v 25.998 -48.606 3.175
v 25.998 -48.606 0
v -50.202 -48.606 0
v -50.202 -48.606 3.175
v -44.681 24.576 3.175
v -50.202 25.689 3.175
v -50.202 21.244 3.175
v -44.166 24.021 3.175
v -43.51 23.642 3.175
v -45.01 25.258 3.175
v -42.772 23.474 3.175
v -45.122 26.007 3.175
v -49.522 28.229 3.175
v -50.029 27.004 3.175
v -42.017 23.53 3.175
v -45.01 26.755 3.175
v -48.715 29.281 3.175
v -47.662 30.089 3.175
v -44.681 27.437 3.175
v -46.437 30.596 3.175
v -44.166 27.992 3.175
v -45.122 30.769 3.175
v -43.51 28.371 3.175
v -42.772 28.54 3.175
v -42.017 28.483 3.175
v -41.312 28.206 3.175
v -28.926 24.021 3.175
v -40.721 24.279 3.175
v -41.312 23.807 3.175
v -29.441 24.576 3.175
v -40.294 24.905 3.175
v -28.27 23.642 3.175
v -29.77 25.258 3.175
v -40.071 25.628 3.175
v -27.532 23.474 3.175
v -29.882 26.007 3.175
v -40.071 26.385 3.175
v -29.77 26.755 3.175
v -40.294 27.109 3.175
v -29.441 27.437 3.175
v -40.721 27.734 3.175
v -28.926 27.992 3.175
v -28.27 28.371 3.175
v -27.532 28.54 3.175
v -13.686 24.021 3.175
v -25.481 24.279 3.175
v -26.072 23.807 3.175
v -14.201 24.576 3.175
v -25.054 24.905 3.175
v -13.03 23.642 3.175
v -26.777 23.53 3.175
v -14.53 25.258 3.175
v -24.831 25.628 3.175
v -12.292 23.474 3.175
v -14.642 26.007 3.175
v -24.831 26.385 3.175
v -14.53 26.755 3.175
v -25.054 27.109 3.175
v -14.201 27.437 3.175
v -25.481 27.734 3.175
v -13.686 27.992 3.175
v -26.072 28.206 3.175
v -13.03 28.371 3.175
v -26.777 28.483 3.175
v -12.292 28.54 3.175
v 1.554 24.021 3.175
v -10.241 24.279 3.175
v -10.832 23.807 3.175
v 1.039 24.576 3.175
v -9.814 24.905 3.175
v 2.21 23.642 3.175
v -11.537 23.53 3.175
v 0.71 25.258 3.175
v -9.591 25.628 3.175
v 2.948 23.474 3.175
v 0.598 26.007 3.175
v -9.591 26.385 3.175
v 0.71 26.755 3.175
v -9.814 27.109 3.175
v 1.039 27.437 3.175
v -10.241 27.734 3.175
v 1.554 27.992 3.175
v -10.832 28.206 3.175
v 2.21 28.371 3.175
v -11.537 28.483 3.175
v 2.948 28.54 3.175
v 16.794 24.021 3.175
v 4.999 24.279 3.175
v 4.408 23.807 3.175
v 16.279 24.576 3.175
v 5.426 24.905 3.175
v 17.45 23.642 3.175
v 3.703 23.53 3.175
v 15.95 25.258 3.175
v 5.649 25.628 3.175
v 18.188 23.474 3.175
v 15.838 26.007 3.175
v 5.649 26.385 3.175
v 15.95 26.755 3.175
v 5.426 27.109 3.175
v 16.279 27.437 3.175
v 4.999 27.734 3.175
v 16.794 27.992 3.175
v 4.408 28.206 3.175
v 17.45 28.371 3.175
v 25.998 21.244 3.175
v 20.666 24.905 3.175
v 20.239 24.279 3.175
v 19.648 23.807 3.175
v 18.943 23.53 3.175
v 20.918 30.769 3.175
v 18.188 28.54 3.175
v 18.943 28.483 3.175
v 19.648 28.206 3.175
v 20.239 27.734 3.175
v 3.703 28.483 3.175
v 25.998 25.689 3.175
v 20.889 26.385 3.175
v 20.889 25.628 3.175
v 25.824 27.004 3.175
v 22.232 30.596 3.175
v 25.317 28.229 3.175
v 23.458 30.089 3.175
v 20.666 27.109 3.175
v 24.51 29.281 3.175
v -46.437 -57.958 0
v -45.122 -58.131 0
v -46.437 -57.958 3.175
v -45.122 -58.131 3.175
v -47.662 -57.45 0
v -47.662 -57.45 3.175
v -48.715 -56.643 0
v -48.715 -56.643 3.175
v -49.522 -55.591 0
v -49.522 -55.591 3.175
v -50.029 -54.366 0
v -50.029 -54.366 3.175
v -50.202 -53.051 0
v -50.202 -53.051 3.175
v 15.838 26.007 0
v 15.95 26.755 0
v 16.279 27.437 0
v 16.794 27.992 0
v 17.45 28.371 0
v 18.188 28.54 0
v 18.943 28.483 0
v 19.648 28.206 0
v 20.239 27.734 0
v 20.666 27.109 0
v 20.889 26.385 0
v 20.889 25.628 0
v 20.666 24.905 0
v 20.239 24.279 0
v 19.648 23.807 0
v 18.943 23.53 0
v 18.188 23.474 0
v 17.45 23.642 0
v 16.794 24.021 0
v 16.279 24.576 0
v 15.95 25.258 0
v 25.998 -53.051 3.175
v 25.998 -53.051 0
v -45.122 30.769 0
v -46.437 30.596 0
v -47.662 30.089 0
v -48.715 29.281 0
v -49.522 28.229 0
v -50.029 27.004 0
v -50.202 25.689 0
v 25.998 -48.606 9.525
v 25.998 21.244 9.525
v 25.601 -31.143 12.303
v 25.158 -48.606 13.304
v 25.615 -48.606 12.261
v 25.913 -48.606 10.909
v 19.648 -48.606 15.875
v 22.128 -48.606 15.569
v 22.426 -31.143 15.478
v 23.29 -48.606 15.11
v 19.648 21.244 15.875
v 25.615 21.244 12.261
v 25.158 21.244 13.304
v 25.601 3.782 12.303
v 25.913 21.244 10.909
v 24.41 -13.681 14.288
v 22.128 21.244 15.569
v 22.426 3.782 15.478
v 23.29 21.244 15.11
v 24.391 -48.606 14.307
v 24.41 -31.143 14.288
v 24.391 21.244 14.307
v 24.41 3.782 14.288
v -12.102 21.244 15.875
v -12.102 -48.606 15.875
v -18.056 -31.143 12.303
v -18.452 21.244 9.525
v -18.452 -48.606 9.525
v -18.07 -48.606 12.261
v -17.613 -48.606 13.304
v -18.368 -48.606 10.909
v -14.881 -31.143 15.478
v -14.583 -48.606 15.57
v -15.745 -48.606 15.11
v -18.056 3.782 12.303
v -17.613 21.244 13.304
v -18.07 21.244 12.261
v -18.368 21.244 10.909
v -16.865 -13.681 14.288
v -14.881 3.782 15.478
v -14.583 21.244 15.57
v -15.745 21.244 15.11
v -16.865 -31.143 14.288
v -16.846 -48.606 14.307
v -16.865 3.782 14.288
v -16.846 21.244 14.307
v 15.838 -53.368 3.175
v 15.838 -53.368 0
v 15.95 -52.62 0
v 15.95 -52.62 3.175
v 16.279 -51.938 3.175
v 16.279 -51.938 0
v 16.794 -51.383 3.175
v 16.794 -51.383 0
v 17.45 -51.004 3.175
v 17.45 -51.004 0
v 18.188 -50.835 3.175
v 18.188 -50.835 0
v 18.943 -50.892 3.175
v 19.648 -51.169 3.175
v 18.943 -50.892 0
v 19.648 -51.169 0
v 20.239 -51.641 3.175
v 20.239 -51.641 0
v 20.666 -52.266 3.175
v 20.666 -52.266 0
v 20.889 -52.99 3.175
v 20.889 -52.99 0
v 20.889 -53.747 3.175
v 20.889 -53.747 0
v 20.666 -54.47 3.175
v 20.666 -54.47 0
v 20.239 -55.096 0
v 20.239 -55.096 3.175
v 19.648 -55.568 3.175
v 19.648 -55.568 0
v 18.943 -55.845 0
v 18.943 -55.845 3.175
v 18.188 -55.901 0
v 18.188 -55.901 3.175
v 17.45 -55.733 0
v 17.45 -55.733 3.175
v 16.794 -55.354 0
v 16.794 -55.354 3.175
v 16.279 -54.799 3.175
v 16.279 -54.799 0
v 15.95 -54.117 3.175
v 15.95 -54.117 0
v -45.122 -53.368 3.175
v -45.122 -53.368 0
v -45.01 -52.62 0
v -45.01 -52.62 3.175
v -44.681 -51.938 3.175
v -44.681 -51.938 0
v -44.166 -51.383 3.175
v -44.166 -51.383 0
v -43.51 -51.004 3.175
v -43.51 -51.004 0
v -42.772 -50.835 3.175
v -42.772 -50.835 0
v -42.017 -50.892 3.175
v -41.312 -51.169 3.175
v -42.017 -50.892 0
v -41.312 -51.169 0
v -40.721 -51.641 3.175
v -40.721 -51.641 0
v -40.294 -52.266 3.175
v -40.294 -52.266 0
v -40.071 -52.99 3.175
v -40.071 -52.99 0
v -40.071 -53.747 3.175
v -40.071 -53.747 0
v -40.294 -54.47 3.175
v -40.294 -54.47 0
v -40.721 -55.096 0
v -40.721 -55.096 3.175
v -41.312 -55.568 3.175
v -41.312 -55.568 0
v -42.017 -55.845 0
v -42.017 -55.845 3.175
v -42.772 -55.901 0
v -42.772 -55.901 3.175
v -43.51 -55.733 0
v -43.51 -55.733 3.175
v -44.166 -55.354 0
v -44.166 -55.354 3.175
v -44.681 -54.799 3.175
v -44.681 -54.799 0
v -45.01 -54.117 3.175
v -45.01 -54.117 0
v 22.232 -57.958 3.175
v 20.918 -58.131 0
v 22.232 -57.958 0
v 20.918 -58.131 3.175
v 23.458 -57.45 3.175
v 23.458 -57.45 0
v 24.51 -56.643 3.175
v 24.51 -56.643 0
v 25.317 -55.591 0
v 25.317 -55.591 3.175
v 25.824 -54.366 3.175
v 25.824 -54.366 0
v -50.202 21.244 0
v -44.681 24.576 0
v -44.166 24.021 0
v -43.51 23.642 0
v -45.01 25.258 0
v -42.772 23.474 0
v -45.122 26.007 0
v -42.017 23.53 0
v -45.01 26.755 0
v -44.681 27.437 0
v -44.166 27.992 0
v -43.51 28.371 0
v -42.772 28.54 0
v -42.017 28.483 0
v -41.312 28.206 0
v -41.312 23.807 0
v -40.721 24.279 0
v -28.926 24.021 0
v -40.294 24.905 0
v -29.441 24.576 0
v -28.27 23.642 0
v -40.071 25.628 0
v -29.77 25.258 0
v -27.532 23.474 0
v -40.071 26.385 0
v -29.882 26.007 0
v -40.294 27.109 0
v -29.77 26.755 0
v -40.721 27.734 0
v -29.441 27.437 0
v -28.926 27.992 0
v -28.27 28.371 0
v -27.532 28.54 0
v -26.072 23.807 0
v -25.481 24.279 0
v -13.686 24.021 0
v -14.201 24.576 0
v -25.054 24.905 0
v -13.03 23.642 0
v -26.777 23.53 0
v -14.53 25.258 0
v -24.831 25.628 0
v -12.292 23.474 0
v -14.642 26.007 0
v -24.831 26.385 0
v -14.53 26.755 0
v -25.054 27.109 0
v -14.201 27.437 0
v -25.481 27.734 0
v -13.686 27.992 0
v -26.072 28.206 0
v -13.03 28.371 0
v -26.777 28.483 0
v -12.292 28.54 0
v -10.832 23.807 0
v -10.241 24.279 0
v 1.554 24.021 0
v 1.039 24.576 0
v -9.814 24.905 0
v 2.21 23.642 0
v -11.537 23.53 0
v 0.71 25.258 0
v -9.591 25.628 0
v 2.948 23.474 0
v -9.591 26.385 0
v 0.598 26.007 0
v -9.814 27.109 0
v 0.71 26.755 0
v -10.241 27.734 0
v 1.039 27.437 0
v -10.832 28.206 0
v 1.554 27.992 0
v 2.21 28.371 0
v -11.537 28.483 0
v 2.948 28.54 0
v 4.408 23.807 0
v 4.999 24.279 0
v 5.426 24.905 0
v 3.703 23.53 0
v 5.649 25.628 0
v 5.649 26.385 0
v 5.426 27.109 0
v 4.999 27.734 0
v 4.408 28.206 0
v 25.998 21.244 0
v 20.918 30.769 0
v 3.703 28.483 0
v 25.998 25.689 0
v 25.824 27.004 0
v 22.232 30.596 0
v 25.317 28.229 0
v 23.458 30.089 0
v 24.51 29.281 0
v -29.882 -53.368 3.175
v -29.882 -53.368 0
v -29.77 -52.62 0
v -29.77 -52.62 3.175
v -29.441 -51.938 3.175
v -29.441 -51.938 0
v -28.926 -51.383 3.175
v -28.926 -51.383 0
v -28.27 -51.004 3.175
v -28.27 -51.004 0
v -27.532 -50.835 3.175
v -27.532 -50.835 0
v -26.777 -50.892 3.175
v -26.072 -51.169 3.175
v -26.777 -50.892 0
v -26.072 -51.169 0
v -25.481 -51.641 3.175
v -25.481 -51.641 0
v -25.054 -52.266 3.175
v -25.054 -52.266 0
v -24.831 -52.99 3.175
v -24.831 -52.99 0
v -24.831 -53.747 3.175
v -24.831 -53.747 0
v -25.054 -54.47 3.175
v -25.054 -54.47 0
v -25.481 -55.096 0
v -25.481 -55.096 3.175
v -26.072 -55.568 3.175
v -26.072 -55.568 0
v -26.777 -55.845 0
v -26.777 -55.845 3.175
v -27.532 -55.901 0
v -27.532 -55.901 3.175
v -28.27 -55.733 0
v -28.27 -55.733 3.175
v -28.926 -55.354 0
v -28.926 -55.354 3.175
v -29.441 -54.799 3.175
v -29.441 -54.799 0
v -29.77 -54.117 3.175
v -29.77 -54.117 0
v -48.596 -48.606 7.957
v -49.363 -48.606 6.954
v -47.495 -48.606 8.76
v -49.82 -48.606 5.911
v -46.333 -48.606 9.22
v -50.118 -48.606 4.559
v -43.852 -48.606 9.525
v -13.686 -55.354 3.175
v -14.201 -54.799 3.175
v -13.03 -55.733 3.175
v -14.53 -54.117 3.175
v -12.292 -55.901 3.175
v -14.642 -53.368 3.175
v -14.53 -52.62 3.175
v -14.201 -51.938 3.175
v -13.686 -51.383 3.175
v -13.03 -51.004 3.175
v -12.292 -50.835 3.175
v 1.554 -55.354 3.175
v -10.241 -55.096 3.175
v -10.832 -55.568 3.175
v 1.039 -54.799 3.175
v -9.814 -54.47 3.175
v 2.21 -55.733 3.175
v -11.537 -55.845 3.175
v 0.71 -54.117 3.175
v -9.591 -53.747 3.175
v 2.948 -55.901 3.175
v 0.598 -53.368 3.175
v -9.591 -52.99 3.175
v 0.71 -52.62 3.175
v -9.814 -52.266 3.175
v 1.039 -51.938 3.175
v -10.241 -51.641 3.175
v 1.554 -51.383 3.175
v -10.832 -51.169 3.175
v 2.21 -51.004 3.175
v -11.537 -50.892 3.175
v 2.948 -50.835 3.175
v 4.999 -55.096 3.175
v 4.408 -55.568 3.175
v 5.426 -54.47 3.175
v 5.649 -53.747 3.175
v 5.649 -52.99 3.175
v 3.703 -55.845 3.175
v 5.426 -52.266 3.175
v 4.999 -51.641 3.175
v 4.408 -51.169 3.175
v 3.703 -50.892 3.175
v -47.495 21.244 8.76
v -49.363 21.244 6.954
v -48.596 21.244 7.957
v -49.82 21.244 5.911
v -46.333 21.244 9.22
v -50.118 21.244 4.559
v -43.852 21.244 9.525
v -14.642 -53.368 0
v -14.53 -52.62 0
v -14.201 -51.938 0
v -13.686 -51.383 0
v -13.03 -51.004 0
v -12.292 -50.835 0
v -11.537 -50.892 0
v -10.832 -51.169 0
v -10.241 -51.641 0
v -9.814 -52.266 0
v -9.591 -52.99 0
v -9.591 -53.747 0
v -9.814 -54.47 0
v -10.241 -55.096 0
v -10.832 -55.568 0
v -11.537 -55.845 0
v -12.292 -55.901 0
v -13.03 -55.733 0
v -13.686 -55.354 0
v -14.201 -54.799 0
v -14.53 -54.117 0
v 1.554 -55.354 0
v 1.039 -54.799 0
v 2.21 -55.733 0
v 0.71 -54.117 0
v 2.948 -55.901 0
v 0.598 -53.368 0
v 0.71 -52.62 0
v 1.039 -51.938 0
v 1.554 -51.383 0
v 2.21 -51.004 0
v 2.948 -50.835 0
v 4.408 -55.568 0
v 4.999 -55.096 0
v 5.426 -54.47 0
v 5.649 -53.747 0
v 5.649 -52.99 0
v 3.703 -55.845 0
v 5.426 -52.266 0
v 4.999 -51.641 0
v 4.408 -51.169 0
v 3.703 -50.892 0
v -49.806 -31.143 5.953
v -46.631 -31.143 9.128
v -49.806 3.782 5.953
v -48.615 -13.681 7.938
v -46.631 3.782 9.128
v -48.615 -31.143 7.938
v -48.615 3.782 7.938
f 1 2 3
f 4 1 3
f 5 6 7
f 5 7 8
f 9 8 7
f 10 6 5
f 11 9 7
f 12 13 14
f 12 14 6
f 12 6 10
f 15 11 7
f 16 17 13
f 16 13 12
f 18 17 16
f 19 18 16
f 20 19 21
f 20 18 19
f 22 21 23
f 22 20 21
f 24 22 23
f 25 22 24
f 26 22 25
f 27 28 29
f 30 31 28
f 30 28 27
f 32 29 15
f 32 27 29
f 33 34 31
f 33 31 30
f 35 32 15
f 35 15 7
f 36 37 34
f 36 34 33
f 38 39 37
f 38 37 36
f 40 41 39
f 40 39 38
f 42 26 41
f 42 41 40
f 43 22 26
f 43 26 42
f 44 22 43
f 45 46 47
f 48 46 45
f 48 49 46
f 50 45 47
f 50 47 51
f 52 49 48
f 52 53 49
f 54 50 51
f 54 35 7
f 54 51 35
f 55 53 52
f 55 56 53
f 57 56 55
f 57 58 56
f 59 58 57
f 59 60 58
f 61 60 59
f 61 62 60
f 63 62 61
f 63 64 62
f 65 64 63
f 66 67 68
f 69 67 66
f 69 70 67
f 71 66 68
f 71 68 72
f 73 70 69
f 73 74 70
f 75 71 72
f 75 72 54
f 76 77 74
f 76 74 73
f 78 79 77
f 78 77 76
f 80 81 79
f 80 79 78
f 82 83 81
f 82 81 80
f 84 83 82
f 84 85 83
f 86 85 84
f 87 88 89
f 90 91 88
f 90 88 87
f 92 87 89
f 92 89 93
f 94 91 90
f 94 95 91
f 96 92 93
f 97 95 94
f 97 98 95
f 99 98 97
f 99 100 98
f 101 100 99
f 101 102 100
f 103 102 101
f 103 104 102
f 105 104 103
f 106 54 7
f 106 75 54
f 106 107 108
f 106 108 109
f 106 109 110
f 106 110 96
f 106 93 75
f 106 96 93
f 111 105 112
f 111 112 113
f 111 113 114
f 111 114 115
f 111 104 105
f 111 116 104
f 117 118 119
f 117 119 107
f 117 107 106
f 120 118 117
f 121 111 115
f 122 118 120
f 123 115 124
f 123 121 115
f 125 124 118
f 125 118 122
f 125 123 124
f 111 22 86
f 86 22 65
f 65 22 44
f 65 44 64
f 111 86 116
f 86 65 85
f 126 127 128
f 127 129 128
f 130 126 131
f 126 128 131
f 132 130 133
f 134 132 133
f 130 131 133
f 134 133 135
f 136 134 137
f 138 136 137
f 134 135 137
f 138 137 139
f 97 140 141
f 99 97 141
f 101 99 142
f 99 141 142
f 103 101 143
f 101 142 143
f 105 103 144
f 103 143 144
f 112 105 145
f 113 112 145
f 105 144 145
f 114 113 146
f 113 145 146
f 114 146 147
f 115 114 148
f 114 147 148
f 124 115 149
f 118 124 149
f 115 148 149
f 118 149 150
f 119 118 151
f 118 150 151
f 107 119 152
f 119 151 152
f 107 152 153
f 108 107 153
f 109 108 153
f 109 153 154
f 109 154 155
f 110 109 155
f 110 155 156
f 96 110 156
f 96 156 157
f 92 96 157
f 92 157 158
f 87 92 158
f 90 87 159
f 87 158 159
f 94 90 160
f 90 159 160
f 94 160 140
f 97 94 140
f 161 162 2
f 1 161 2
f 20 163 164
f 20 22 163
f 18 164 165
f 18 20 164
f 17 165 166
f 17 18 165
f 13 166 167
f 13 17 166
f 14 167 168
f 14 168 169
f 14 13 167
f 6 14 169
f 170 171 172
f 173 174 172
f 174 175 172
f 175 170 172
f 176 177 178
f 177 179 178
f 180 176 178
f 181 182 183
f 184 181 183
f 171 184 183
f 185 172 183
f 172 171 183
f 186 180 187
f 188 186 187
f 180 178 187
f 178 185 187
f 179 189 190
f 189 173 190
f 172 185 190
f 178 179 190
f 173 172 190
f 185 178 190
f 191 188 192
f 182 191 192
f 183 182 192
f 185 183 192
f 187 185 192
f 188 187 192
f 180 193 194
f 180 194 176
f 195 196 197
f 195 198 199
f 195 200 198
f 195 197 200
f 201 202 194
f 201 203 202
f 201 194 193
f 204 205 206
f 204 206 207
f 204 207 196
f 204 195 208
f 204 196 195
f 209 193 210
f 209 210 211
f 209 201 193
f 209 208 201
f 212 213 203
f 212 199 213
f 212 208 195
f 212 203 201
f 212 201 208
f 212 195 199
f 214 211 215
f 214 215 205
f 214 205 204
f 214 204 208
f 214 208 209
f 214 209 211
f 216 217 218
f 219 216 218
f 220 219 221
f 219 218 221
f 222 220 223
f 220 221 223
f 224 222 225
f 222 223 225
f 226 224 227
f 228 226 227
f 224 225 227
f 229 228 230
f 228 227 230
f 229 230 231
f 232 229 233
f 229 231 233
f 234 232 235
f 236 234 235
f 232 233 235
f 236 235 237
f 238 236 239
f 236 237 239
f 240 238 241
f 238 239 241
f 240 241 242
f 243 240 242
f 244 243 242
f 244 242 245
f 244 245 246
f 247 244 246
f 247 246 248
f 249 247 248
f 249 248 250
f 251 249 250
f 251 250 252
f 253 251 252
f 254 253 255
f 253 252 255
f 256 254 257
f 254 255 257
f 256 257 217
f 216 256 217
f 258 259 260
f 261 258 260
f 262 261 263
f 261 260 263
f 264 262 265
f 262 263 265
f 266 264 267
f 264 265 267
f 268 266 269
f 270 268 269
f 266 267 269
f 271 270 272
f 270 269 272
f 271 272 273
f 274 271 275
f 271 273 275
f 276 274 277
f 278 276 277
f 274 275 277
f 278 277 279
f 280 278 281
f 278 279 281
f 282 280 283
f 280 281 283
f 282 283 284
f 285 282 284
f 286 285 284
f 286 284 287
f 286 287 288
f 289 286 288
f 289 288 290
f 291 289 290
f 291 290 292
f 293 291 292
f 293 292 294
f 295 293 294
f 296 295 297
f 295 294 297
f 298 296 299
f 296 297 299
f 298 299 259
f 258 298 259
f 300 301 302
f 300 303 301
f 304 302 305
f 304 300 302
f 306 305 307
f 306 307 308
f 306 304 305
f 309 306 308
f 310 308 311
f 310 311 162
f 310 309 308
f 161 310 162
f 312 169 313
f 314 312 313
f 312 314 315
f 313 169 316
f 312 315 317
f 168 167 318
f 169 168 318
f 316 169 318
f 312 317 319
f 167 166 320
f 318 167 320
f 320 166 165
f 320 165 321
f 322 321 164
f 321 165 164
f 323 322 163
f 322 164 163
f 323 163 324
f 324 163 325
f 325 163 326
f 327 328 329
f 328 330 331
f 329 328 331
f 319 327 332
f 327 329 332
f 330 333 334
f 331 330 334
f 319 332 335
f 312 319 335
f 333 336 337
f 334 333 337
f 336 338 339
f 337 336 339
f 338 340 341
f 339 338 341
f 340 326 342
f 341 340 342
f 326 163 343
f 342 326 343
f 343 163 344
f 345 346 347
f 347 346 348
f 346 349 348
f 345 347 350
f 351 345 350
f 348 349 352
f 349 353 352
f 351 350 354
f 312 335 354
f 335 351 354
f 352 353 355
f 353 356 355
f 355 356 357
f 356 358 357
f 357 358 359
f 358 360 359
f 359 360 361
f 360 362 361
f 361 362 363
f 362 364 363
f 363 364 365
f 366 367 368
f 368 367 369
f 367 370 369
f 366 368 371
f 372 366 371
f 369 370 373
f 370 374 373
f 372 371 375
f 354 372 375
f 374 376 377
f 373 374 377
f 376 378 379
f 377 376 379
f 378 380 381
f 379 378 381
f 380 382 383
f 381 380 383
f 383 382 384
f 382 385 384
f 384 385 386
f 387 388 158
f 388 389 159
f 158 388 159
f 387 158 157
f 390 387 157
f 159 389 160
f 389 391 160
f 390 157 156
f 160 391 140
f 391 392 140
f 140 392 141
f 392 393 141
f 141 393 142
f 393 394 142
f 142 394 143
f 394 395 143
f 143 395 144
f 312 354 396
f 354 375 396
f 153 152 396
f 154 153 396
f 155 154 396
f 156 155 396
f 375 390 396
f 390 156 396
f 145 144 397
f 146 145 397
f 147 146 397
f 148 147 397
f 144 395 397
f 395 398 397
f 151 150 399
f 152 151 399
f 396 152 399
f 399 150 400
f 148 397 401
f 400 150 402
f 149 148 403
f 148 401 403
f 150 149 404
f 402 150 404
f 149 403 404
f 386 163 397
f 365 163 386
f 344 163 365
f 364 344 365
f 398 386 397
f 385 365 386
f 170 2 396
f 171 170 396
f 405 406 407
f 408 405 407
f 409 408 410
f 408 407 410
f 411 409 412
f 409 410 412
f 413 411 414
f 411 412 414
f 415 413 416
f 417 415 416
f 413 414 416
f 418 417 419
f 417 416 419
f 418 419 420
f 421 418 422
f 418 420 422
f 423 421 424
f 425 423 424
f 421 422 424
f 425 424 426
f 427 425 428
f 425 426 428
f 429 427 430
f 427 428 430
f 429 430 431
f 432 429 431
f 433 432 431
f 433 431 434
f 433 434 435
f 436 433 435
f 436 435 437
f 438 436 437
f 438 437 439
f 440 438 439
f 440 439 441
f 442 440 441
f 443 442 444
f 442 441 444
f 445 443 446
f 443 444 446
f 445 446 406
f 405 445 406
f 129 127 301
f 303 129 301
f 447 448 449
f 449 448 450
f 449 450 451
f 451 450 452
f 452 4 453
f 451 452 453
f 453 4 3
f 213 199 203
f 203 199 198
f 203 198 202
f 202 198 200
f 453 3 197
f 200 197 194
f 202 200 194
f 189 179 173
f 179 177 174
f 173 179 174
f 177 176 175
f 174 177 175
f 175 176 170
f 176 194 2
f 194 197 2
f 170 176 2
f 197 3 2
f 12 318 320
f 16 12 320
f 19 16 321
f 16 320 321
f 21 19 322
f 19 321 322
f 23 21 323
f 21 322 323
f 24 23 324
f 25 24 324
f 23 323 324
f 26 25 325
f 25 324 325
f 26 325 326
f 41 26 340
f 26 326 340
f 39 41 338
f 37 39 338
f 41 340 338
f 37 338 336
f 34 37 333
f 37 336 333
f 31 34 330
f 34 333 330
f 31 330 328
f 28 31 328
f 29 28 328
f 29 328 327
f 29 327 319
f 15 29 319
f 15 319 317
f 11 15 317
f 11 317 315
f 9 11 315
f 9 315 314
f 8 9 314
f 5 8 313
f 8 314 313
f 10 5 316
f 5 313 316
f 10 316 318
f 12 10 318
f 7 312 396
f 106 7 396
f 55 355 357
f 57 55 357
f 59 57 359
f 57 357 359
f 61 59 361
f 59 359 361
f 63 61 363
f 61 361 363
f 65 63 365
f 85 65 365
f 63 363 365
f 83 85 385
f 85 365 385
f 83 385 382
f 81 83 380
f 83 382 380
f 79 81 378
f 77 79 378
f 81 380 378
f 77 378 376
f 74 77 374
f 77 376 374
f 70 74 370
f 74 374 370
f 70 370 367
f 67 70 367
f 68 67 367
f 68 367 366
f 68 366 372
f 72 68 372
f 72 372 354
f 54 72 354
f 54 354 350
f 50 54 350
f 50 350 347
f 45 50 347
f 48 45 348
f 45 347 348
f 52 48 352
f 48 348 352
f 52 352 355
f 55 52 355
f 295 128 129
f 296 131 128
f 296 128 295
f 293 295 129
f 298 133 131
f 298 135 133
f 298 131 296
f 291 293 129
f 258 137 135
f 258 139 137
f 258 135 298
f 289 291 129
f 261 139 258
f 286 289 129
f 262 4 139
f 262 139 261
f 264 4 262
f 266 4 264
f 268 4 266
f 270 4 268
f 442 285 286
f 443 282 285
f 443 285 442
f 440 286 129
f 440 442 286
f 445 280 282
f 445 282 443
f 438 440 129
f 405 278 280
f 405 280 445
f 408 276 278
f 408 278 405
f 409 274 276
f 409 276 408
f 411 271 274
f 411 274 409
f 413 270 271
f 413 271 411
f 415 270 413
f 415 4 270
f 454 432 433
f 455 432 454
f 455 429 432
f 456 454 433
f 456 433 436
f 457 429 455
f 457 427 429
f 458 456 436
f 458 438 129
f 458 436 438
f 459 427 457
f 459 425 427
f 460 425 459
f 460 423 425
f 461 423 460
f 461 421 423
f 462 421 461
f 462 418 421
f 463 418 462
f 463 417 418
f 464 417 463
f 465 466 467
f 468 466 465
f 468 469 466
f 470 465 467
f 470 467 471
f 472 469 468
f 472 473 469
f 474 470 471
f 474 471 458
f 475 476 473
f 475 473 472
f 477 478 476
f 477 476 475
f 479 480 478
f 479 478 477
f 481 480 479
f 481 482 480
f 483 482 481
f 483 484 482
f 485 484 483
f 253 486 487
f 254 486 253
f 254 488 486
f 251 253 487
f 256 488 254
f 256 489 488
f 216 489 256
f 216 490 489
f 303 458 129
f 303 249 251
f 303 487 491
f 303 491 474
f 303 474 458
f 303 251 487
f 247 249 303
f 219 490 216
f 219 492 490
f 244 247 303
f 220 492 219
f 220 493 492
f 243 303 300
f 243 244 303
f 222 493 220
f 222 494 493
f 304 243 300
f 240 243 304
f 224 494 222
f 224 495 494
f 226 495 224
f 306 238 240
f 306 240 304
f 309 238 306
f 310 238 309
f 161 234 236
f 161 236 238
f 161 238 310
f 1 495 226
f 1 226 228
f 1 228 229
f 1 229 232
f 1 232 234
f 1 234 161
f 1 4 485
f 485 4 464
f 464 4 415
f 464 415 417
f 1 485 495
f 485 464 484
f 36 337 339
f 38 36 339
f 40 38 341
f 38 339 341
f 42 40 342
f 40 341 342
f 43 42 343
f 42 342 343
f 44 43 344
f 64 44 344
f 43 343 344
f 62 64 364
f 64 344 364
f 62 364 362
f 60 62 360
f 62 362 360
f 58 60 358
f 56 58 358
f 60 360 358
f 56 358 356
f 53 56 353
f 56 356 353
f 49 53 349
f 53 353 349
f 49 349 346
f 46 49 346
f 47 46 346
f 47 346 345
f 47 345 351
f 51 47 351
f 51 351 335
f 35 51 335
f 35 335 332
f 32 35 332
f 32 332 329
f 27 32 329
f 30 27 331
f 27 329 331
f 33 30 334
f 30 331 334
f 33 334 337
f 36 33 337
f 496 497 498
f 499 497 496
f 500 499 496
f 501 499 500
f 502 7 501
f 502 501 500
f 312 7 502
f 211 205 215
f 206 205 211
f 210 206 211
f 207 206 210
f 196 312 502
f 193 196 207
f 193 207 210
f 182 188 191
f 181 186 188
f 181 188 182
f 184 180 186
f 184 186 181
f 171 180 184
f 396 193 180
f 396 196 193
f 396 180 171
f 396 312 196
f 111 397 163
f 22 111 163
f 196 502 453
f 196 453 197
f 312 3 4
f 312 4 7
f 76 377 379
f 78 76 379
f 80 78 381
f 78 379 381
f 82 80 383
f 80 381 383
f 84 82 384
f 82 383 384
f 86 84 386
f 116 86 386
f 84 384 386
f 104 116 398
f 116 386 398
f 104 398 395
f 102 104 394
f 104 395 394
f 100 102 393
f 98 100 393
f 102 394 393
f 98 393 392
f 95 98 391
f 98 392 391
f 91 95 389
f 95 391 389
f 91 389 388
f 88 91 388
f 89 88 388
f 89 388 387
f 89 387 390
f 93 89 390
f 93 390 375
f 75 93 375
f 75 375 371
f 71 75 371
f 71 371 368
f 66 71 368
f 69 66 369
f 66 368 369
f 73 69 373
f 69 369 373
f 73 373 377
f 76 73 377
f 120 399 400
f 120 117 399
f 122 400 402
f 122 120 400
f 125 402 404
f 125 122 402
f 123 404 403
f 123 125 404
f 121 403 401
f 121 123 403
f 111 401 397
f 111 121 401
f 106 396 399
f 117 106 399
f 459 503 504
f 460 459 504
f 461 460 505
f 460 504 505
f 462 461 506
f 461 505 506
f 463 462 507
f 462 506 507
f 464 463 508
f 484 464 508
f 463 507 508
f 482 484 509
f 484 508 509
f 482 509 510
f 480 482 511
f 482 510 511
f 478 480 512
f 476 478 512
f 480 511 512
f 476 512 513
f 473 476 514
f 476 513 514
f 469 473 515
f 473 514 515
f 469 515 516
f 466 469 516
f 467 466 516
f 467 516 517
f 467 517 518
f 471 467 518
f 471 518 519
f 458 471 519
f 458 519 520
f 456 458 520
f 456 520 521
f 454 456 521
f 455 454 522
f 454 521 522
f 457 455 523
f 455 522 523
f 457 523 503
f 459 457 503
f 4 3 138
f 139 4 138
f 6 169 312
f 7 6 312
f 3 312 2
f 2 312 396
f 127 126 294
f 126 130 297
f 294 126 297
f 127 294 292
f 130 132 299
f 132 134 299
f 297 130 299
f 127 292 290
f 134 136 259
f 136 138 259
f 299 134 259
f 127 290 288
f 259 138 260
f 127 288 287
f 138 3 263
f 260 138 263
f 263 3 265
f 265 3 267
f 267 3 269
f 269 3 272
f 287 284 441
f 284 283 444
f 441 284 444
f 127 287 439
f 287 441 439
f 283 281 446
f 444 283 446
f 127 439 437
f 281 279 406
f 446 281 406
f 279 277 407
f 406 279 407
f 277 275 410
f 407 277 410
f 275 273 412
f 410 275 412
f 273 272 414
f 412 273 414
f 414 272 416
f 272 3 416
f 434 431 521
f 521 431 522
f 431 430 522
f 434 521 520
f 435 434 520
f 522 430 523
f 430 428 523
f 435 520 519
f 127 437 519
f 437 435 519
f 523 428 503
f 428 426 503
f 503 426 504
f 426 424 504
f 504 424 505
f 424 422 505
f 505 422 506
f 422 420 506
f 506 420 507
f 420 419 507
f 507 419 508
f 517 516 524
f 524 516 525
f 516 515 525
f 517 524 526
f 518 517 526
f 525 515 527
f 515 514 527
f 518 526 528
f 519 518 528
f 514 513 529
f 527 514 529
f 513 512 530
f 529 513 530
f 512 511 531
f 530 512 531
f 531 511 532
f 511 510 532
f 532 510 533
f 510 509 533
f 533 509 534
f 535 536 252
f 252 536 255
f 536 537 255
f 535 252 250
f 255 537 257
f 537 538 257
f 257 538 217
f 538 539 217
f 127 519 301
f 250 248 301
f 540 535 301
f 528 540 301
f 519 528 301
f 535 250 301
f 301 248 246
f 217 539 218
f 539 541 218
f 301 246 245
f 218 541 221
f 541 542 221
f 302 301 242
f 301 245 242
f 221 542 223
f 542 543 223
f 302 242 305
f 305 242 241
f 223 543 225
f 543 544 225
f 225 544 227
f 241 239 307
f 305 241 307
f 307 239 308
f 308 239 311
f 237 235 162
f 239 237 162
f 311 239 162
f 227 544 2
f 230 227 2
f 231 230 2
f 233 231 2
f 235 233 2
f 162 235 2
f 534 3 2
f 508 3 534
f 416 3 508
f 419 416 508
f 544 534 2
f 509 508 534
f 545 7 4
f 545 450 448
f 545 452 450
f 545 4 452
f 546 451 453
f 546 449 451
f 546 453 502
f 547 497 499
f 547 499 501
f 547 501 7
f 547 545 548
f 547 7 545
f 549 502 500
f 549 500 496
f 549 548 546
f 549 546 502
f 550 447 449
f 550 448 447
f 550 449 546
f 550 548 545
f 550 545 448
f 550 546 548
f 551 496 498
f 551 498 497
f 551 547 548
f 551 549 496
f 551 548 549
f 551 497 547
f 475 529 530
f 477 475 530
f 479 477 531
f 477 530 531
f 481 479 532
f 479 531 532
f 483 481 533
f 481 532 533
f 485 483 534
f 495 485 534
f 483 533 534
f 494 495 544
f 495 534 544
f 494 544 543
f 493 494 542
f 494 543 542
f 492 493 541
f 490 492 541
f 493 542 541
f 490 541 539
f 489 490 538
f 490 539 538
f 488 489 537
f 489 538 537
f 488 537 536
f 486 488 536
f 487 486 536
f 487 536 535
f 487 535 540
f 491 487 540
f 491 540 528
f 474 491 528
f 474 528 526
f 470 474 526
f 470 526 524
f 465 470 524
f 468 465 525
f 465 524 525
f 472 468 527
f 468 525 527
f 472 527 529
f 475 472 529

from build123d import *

# Parameters (mm, degrees)
F1_DEPTH    = 3.175
F0_W        = 76.2
F0_H        = 69.85
F2_DEPTH    = 9.525
F3_W        = 44.45
F3_H        = 69.85
F4_DEPTH    = 6.35
F5_T1_DEPTH = 101.6
F6_R        = 5.08
F6_2_R      = 5.08


# Not quite as in the source:
# - a fillet or chamfer that OpenCascade refuses, or shapes differently, is made with other operations: its cross-section is extruded or revolved along the edge and cut away or added


with BuildPart() as f1:
    # F0 (on Top) → F1 (new body)
    with BuildSketch(Plane.XY):
        with BuildLine():
            Line((-45.1224932384, -53.3683788409), (-50.2024932384, -53.3683788409))
            Line((-50.2024932384, -53.3683788409), (-50.2024932384, -58.1308788409))
            Line((-50.2024932384, -58.1308788409), (25.9975067616, -58.1308788409))
            Line((25.9975067616, -58.1308788409), (25.9975067616, -53.3683788409))
            Line((25.9975067616, -53.3683788409), (20.9175067616, -53.3683788409))
            ThreePointArc((20.9175067616, -53.3683788409), (18.3775067616, -55.9083788409), (15.8375067616, -53.3683788409))
            Line((15.8375067616, -53.3683788409), (5.6775067616, -53.3683788409))
            ThreePointArc((5.6775067616, -53.3683788409), (3.1375067616, -55.9083788409), (0.5975067616, -53.3683788409))
            Line((0.5975067616, -53.3683788409), (-9.5624932384, -53.3683788409))
            ThreePointArc((-9.5624932384, -53.3683788409), (-12.1024932384, -55.9083788409), (-14.6424932384, -53.3683788409))
            Line((-14.6424932384, -53.3683788409), (-24.8024932384, -53.3683788409))
            ThreePointArc((-24.8024932384, -53.3683788409), (-27.3424932384, -55.9083788409), (-29.8824932384, -53.3683788409))
            Line((-29.8824932384, -53.3683788409), (-40.0424932384, -53.3683788409))
            ThreePointArc((-40.0424932384, -53.3683788409), (-42.5824932384, -55.9083788409), (-45.1224932384, -53.3683788409))
        make_face()
        with BuildLine():
            Line((25.9975067616, -48.6058788409), (-50.2024932384, -48.6058788409))
            Line((-50.2024932384, -48.6058788409), (-50.2024932384, -53.3683788409))
            Line((-50.2024932384, -53.3683788409), (-45.1224932384, -53.3683788409))
            ThreePointArc((-45.1224932384, -53.3683788409), (-42.5824932384, -50.8283788409), (-40.0424932384, -53.3683788409))
            Line((-40.0424932384, -53.3683788409), (-29.8824932384, -53.3683788409))
            ThreePointArc((-29.8824932384, -53.3683788409), (-27.3424932384, -50.8283788409), (-24.8024932384, -53.3683788409))
            Line((-24.8024932384, -53.3683788409), (-14.6424932384, -53.3683788409))
            ThreePointArc((-14.6424932384, -53.3683788409), (-12.1024932384, -50.8283788409), (-9.5624932384, -53.3683788409))
            Line((-9.5624932384, -53.3683788409), (0.5975067616, -53.3683788409))
            ThreePointArc((0.5975067616, -53.3683788409), (3.1375067616, -50.8283788409), (5.6775067616, -53.3683788409))
            Line((5.6775067616, -53.3683788409), (15.8375067616, -53.3683788409))
            ThreePointArc((15.8375067616, -53.3683788409), (18.3775067616, -50.8283788409), (20.9175067616, -53.3683788409))
            Line((20.9175067616, -53.3683788409), (25.9975067616, -53.3683788409))
            Line((25.9975067616, -53.3683788409), (25.9975067616, -48.6058788409))
        make_face()
    extrude(amount=F1_DEPTH)

    # F6#2
    f6_2_edges = [f1.edges().sort_by_distance(p)[0] for p in [
        (-50.202493, -58.130879, 1.5875),
        (25.997507, -58.130879, 1.5875),
    ]]
    fillet(f6_2_edges, radius=F6_2_R)


with BuildPart() as f1b:
    # F0 (on Top) → F1, piece 2 (new body)
    with BuildSketch(Plane.XY):
        with BuildLine():
            Line((-45.1224932384, 26.0066211591), (-50.2024932384, 26.0066211591))
            Line((-50.2024932384, 26.0066211591), (-50.2024932384, 21.2441211591))
            Line((-50.2024932384, 21.2441211591), (25.9975067616, 21.2441211591))
            Line((25.9975067616, 21.2441211591), (25.9975067616, 26.0066211591))
            Line((25.9975067616, 26.0066211591), (20.9175067616, 26.0066211591))
            ThreePointArc((20.9175067616, 26.0066211591), (18.3775067616, 23.4666211591), (15.8375067616, 26.0066211591))
            Line((15.8375067616, 26.0066211591), (5.6775067616, 26.0066211591))
            ThreePointArc((5.6775067616, 26.0066211591), (3.1375067616, 23.4666211591), (0.5975067616, 26.0066211591))
            Line((0.5975067616, 26.0066211591), (-9.5624932384, 26.0066211591))
            ThreePointArc((-9.5624932384, 26.0066211591), (-12.1024932384, 23.4666211591), (-14.6424932384, 26.0066211591))
            Line((-14.6424932384, 26.0066211591), (-24.8024932384, 26.0066211591))
            ThreePointArc((-24.8024932384, 26.0066211591), (-27.3424932384, 23.4666211591), (-29.8824932384, 26.0066211591))
            Line((-29.8824932384, 26.0066211591), (-40.0424932384, 26.0066211591))
            ThreePointArc((-40.0424932384, 26.0066211591), (-42.5824932384, 23.4666211591), (-45.1224932384, 26.0066211591))
        make_face()
        with BuildLine():
            Line((25.9975067616, 30.7691211591), (-50.2024932384, 30.7691211591))
            Line((-50.2024932384, 30.7691211591), (-50.2024932384, 26.0066211591))
            Line((-50.2024932384, 26.0066211591), (-45.1224932384, 26.0066211591))
            ThreePointArc((-45.1224932384, 26.0066211591), (-42.5824932384, 28.5466211591), (-40.0424932384, 26.0066211591))
            Line((-40.0424932384, 26.0066211591), (-29.8824932384, 26.0066211591))
            ThreePointArc((-29.8824932384, 26.0066211591), (-27.3424932384, 28.5466211591), (-24.8024932384, 26.0066211591))
            Line((-24.8024932384, 26.0066211591), (-14.6424932384, 26.0066211591))
            ThreePointArc((-14.6424932384, 26.0066211591), (-12.1024932384, 28.5466211591), (-9.5624932384, 26.0066211591))
            Line((-9.5624932384, 26.0066211591), (0.5975067616, 26.0066211591))
            ThreePointArc((0.5975067616, 26.0066211591), (3.1375067616, 28.5466211591), (5.6775067616, 26.0066211591))
            Line((5.6775067616, 26.0066211591), (15.8375067616, 26.0066211591))
            ThreePointArc((15.8375067616, 26.0066211591), (18.3775067616, 28.5466211591), (20.9175067616, 26.0066211591))
            Line((20.9175067616, 26.0066211591), (25.9975067616, 26.0066211591))
            Line((25.9975067616, 26.0066211591), (25.9975067616, 30.7691211591))
        make_face()
    extrude(amount=F1_DEPTH)

    # F6
    f6_edges = [f1b.edges().sort_by_distance(p)[0] for p in [
        (25.997507, 30.769121, 1.5875),
        (-50.202493, 30.769121, 1.5875),
    ]]
    fillet(f6_edges, radius=F6_R)


with BuildPart() as f2:
    # F0 (on Top) → F2 (new body)
    with BuildSketch(Plane.XY):
        with Locations((-12.1024932384, -13.6808788409)):
            Rectangle(F0_W, F0_H)
    extrude(amount=F2_DEPTH)

    # F3 (on face) → F4 (join)
    with BuildSketch(Plane.XY.offset(9.525)):
        with Locations((3.7725067616, -13.6808788409)):
            Rectangle(F3_W, F3_H)
    extrude(amount=F4_DEPTH)

    # F5: fillet of radius 6.35 on 3 edges, made by hand

    # F5_s2 → F5_t1 (cut)
    with BuildSketch(Plane.XZ.offset(-37.1191211591)):
        with BuildLine():
            add(Edge.make_bspline(
                [(-18.4524932384, 9.525), (-18.4524932384, 15.875), (-12.1024932384, 15.875)],
                knots=[0, 0, 0, 1, 1, 1], degree=2, weights=[1, 1, 1]))
            Line((-12.1024932384, 15.875), (-18.4524932384, 15.875))
            Line((-18.4524932384, 15.875), (-18.4524932384, 9.525))
        make_face()
        with BuildLine():
            add(Edge.make_bspline(
                [(25.9975067616, 9.525), (25.9975067616, 15.875), (19.6475067616, 15.875)],
                knots=[0, 0, 0, 1, 1, 1], degree=2, weights=[1, 1, 1]))
            Line((19.6475067616, 15.875), (25.9975067616, 15.875))
            Line((25.9975067616, 15.875), (25.9975067616, 9.525))
        make_face()
        with BuildLine():
            add(Edge.make_bspline(
                [(-50.2024932384, 3.175), (-50.2024932384, 9.525), (-43.8524932384, 9.525)],
                knots=[0, 0, 0, 1, 1, 1], degree=2, weights=[1, 1, 1]))
            Line((-43.8524932384, 9.525), (-50.2024932384, 9.525))
            Line((-50.2024932384, 9.525), (-50.2024932384, 3.175))
        make_face()
    extrude(amount=F5_T1_DEPTH, mode=Mode.SUBTRACT)


solid = Compound([f1.part, f1b.part, f2.part])
